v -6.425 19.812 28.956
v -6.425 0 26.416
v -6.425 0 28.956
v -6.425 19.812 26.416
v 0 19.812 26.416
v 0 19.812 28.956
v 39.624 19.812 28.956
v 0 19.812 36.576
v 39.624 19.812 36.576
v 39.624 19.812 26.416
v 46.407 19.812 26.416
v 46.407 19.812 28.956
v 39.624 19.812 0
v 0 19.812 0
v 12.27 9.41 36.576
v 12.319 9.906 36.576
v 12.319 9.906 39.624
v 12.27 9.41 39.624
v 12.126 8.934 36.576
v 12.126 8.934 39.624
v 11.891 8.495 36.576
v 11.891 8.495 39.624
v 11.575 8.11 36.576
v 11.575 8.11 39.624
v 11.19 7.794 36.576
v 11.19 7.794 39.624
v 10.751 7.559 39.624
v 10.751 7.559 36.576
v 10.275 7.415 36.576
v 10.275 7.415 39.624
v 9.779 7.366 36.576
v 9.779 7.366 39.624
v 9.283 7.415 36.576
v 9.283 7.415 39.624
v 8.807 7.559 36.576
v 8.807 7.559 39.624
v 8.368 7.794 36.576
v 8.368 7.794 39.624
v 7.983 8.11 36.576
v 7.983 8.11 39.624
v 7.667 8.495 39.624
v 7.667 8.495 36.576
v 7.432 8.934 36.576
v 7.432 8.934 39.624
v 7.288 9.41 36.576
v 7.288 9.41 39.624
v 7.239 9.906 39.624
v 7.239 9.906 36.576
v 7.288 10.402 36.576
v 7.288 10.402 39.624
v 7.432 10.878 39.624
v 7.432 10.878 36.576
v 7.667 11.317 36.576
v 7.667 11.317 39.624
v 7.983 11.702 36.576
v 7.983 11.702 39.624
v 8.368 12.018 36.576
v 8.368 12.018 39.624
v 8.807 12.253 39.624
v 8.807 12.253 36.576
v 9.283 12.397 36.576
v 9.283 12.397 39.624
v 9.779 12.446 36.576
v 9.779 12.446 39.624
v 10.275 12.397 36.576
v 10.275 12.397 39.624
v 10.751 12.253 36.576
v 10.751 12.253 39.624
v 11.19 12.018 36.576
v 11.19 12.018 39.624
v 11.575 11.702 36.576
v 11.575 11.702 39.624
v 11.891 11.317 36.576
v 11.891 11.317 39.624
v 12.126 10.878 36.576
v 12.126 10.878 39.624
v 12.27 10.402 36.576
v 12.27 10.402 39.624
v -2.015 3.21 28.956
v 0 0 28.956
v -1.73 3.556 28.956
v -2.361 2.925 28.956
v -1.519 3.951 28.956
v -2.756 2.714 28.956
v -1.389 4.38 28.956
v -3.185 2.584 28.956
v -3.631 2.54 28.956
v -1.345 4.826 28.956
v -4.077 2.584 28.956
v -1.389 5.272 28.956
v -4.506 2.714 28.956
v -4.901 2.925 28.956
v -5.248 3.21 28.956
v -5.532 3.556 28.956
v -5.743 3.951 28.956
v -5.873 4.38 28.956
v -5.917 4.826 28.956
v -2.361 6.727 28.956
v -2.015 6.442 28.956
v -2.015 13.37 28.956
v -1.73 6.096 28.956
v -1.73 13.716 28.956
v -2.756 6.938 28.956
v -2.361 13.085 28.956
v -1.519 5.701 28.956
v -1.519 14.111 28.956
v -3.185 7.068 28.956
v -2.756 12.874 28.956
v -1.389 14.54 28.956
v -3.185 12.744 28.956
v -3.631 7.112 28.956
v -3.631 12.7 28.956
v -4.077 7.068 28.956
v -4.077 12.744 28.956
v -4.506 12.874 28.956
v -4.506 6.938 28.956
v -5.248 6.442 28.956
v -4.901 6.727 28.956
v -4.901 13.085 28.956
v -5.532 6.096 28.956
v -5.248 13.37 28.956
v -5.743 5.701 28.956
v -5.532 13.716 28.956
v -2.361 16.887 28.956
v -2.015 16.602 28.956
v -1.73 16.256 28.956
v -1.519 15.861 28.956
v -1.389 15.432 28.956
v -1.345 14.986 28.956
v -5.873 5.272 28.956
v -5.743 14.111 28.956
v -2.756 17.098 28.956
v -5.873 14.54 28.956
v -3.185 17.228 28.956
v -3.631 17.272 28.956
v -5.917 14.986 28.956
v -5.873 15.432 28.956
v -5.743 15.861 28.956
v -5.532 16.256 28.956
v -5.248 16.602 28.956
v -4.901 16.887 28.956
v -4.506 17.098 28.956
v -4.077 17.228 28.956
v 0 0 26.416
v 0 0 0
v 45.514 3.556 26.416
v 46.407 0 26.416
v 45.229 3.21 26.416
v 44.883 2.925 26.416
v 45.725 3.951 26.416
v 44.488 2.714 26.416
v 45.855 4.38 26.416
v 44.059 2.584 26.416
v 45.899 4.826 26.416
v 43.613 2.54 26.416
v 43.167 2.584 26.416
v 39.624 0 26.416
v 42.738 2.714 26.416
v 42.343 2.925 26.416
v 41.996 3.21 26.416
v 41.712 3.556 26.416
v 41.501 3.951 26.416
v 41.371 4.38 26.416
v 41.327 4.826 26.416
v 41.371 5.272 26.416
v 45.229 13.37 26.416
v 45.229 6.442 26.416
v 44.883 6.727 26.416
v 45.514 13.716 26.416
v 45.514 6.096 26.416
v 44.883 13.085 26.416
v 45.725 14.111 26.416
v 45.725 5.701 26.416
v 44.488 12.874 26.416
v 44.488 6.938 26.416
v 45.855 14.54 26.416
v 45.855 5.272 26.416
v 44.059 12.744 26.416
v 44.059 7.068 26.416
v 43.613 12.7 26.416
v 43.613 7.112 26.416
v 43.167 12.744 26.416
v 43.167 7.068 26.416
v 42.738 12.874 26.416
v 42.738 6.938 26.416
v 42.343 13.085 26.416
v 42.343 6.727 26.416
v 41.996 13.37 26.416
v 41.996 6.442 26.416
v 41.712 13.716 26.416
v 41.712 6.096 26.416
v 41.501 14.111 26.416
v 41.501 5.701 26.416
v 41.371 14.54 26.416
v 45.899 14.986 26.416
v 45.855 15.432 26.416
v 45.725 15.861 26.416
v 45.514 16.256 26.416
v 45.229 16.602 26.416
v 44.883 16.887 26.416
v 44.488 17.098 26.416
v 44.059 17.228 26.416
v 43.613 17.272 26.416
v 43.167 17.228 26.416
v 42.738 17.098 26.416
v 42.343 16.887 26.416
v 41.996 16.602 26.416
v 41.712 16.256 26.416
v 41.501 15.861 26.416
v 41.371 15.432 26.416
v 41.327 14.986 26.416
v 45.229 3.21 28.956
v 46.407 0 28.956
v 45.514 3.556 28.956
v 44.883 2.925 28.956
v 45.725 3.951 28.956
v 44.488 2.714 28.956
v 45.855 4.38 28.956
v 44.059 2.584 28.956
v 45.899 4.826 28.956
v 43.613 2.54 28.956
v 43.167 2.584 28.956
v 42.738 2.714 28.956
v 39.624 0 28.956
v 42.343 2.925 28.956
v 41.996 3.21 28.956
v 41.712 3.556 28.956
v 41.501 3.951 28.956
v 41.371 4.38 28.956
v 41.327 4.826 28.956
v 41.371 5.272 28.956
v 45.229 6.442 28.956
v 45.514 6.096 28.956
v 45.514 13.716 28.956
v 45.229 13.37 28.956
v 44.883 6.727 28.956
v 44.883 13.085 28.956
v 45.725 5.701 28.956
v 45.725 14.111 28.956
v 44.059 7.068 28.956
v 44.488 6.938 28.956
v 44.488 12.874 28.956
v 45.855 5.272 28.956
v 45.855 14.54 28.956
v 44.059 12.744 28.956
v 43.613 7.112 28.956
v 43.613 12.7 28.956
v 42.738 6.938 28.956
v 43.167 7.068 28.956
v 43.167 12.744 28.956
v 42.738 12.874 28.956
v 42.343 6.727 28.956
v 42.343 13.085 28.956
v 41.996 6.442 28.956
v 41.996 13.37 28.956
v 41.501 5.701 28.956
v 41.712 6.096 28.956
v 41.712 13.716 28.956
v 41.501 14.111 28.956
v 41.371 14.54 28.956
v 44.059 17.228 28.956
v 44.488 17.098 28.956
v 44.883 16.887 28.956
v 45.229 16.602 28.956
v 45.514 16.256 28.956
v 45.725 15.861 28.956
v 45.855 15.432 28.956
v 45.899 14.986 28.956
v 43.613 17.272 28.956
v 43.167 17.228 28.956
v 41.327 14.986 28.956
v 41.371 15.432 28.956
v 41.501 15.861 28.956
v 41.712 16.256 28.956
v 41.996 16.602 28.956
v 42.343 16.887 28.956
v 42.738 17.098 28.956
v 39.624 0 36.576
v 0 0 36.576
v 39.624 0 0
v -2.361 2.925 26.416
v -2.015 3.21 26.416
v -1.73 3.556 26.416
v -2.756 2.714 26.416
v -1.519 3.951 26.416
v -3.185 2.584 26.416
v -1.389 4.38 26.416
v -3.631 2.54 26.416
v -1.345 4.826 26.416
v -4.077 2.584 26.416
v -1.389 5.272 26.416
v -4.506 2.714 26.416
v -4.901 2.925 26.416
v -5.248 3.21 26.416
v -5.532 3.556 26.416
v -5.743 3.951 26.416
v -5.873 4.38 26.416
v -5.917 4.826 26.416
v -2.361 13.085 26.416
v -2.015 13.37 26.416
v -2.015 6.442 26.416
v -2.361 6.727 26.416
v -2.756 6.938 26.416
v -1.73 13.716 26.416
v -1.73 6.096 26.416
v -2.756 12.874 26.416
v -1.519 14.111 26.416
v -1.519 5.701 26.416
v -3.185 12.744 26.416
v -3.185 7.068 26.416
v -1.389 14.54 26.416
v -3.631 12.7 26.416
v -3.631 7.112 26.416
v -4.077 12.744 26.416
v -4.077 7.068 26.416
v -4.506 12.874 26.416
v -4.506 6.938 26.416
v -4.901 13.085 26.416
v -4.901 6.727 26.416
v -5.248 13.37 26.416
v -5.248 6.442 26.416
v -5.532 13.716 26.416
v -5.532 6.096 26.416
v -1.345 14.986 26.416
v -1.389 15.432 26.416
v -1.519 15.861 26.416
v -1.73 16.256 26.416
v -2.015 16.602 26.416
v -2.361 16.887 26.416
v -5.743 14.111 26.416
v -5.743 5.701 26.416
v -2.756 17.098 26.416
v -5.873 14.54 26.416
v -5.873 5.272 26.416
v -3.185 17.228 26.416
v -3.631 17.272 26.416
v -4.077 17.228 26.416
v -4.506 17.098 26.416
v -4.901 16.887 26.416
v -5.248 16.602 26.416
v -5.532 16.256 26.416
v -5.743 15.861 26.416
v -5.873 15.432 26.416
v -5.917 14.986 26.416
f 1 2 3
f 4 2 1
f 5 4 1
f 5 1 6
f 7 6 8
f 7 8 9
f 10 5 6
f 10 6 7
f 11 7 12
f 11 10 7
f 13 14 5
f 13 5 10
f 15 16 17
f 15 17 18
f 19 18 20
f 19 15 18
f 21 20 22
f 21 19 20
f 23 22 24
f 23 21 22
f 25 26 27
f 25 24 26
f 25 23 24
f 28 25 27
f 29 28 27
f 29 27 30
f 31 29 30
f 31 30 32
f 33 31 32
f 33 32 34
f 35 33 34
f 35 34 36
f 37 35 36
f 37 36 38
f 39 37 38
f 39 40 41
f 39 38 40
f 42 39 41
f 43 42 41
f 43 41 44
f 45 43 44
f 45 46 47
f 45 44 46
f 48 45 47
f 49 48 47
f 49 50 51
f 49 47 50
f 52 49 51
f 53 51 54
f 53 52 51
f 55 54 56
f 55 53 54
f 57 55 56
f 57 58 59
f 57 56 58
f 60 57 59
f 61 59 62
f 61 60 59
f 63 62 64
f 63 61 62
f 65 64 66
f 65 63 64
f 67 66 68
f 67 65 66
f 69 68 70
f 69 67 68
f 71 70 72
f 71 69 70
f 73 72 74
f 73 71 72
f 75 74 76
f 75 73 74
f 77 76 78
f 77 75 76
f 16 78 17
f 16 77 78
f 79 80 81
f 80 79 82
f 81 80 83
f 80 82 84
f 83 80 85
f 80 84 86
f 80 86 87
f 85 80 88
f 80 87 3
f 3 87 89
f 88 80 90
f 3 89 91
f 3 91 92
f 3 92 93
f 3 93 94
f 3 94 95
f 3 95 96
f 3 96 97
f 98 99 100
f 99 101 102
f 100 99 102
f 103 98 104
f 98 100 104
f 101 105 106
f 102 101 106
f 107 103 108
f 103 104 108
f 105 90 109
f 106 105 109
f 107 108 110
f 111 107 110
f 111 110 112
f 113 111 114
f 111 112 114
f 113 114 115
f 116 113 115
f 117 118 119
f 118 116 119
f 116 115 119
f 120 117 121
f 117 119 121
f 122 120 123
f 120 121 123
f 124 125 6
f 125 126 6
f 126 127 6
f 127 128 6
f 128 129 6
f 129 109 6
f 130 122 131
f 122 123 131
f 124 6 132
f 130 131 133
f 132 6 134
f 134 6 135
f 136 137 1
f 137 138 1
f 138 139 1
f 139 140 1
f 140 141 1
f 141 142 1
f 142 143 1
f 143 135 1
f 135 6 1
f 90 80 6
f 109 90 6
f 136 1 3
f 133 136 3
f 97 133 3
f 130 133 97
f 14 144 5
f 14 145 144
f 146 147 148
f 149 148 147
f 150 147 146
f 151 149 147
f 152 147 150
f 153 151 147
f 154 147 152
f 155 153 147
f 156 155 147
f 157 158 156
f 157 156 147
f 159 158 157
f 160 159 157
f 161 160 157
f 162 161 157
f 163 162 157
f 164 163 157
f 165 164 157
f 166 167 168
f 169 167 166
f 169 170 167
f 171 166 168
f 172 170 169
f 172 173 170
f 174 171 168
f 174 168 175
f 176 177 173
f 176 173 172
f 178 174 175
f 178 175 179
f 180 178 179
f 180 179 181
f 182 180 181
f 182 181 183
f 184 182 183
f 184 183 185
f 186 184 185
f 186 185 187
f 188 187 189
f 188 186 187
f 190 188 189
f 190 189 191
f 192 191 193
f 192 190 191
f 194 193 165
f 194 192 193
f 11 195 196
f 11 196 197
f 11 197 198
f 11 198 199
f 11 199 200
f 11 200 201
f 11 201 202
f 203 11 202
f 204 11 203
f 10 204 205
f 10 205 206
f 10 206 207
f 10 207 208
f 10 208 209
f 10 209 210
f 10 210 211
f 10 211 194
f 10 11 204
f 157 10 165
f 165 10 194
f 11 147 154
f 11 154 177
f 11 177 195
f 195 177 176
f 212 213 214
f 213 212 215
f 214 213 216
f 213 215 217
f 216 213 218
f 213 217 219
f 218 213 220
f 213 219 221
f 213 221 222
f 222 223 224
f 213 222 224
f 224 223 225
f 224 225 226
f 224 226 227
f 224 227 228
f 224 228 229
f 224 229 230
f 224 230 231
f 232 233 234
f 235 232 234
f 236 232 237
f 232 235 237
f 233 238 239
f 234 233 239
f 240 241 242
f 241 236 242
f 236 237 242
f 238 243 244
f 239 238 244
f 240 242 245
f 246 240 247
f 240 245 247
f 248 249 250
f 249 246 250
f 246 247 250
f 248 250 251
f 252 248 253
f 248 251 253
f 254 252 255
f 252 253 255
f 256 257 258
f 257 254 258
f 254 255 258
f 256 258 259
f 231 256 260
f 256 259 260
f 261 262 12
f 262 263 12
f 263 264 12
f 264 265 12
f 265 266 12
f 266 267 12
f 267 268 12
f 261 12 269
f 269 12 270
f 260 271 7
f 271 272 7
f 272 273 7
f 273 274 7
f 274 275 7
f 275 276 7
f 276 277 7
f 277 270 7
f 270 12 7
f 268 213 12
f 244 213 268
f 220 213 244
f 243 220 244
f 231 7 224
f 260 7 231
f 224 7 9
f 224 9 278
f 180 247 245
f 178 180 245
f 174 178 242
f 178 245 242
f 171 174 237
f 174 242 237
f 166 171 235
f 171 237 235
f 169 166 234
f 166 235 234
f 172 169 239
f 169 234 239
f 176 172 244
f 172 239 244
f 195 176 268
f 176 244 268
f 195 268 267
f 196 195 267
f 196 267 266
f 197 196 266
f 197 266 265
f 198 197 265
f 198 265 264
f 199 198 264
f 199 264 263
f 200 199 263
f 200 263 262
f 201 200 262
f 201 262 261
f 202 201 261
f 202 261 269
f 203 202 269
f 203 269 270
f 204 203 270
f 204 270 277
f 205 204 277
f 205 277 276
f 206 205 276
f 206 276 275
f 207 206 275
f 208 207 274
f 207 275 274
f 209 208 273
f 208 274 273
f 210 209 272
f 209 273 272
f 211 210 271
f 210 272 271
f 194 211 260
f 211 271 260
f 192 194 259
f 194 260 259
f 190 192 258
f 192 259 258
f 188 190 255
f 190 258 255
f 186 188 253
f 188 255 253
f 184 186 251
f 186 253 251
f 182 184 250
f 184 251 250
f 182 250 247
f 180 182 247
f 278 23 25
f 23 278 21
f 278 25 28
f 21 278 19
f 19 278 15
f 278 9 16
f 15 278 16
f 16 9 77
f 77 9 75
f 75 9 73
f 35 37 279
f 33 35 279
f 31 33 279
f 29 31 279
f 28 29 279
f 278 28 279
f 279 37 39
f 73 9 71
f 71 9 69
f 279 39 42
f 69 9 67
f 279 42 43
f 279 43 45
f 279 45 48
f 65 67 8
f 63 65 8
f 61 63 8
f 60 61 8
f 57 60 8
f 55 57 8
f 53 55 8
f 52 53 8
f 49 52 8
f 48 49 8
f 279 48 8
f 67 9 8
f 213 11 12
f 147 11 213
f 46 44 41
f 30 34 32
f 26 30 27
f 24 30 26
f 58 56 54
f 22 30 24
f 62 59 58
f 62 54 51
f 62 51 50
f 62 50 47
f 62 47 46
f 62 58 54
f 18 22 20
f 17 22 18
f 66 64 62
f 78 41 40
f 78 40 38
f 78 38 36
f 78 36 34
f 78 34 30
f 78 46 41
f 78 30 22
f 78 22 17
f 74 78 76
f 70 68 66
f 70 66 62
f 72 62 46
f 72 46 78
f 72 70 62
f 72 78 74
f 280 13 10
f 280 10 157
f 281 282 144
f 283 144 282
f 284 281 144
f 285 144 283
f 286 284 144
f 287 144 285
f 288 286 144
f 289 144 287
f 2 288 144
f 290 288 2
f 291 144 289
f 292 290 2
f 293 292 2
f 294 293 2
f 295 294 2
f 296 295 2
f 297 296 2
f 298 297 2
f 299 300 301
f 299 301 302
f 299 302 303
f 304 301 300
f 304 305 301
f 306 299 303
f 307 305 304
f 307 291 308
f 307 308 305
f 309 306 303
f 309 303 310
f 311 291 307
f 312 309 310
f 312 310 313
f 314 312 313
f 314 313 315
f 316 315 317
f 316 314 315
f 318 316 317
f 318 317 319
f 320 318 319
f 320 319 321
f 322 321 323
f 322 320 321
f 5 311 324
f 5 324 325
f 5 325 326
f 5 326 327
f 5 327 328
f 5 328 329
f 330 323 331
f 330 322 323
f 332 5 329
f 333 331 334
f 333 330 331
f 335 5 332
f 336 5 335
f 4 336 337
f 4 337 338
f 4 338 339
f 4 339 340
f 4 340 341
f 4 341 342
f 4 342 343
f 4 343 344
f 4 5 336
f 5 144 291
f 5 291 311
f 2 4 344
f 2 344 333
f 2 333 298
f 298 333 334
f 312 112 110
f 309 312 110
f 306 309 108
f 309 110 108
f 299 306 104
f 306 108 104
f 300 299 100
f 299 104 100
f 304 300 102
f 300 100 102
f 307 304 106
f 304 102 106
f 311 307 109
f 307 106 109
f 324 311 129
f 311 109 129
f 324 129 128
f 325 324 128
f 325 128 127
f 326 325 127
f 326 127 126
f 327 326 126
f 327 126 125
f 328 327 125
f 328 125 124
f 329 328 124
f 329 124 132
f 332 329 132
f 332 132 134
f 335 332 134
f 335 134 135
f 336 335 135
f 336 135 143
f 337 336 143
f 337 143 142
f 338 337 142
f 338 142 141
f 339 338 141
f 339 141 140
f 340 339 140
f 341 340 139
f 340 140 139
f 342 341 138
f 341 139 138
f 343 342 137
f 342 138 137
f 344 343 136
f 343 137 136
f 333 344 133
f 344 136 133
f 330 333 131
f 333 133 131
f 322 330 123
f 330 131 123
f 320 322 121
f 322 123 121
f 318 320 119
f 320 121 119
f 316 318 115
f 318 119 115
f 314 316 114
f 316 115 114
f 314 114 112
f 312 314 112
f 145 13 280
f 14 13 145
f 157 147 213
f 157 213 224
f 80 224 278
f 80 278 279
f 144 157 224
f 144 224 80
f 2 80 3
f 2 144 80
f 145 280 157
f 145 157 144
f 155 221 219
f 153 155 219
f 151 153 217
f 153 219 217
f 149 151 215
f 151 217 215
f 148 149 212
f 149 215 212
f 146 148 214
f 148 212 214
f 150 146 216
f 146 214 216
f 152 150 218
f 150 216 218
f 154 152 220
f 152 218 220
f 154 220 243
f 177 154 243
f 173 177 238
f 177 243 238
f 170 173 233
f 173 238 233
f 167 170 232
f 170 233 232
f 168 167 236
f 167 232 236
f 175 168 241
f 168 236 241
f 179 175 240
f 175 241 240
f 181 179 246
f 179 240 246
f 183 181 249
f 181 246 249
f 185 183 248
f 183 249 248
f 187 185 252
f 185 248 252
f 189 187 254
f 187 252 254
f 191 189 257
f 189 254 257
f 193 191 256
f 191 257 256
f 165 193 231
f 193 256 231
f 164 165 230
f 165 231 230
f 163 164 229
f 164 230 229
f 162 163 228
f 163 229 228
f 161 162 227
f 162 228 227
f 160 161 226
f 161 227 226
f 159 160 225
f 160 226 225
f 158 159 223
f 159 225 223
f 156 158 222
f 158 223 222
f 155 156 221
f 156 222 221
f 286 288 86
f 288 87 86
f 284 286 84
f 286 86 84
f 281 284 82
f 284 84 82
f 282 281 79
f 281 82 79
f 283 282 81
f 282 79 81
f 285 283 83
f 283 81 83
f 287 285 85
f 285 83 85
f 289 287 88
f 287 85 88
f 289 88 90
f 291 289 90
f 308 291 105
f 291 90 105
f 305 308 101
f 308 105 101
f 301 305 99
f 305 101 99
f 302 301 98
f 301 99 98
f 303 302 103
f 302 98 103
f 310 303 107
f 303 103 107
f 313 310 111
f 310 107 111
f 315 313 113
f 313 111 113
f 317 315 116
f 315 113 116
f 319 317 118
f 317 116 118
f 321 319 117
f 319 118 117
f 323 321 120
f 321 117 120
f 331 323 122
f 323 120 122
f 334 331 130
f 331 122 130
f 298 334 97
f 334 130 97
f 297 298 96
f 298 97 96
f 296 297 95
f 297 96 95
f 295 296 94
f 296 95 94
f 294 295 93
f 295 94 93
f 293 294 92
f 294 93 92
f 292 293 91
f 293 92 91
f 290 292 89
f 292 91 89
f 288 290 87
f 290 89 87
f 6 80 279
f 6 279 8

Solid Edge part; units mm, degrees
sketch "Sketch1" plane through (0, 0, 0) normal (0, 0, 1) x (1, 0, 0)
  line L0 (0, 0) -> (0, 19.812)
  line L1 (0, 19.812) -> (39.624, 19.812)
  line L2 (39.624, 19.812) -> (39.624, 0)
  line L3 (39.624, 0) -> (0, 0)
  dimension "D1" = 39.624
  dimension "D2" = 19.812
extrude "Protrusion1" add sketch "Sketch1" along normal blind 36.576
sketch "Sketch2" plane through (19.812, 9.906, 26.416) normal (0, 0, 1) x (1, 0, 0)
  line L0 (-26.2372, -9.906) -> (-26.2372, 9.906)
  line L1 (-26.2372, 9.906) -> (26.5948, 9.906)
  line L2 (26.5948, 9.906) -> (26.5948, -9.906)
  line L3 (26.5948, -9.906) -> (-26.2372, -9.906)
  dimension "D1" = 26.416
extrude "ExtrudedProtrusion_2" add sketch "Sketch2" along normal blind 2.54
sketch "Sketch3" plane through (19.812, 9.906, 36.576) normal (0, 0, 1) x (1, 0, 0)
  circle A0 centre (-10.033, 0) radius 2.54
  dimension "D1" = 9.779
extrude "ExtrudedProtrusion_3" add sketch "Sketch3" along normal blind 3.048
hole "Hole_1" at (-3.6312, 4.826, 28.956) direction (0, 0, -1) diameter 4.572 end through all
hole "Hole1" at (43.6128, 4.826, 28.956) direction (0, 0, -1) diameter 4.572 end through all
hole "Hole2" at (43.6128, 14.986, 28.956) direction (0, 0, -1) diameter 4.572 end through all
hole "Hole3" at (-3.6312, 14.986, 28.956) direction (0, 0, -1) diameter 4.572 end through all
properties part number "HARDWARE"
